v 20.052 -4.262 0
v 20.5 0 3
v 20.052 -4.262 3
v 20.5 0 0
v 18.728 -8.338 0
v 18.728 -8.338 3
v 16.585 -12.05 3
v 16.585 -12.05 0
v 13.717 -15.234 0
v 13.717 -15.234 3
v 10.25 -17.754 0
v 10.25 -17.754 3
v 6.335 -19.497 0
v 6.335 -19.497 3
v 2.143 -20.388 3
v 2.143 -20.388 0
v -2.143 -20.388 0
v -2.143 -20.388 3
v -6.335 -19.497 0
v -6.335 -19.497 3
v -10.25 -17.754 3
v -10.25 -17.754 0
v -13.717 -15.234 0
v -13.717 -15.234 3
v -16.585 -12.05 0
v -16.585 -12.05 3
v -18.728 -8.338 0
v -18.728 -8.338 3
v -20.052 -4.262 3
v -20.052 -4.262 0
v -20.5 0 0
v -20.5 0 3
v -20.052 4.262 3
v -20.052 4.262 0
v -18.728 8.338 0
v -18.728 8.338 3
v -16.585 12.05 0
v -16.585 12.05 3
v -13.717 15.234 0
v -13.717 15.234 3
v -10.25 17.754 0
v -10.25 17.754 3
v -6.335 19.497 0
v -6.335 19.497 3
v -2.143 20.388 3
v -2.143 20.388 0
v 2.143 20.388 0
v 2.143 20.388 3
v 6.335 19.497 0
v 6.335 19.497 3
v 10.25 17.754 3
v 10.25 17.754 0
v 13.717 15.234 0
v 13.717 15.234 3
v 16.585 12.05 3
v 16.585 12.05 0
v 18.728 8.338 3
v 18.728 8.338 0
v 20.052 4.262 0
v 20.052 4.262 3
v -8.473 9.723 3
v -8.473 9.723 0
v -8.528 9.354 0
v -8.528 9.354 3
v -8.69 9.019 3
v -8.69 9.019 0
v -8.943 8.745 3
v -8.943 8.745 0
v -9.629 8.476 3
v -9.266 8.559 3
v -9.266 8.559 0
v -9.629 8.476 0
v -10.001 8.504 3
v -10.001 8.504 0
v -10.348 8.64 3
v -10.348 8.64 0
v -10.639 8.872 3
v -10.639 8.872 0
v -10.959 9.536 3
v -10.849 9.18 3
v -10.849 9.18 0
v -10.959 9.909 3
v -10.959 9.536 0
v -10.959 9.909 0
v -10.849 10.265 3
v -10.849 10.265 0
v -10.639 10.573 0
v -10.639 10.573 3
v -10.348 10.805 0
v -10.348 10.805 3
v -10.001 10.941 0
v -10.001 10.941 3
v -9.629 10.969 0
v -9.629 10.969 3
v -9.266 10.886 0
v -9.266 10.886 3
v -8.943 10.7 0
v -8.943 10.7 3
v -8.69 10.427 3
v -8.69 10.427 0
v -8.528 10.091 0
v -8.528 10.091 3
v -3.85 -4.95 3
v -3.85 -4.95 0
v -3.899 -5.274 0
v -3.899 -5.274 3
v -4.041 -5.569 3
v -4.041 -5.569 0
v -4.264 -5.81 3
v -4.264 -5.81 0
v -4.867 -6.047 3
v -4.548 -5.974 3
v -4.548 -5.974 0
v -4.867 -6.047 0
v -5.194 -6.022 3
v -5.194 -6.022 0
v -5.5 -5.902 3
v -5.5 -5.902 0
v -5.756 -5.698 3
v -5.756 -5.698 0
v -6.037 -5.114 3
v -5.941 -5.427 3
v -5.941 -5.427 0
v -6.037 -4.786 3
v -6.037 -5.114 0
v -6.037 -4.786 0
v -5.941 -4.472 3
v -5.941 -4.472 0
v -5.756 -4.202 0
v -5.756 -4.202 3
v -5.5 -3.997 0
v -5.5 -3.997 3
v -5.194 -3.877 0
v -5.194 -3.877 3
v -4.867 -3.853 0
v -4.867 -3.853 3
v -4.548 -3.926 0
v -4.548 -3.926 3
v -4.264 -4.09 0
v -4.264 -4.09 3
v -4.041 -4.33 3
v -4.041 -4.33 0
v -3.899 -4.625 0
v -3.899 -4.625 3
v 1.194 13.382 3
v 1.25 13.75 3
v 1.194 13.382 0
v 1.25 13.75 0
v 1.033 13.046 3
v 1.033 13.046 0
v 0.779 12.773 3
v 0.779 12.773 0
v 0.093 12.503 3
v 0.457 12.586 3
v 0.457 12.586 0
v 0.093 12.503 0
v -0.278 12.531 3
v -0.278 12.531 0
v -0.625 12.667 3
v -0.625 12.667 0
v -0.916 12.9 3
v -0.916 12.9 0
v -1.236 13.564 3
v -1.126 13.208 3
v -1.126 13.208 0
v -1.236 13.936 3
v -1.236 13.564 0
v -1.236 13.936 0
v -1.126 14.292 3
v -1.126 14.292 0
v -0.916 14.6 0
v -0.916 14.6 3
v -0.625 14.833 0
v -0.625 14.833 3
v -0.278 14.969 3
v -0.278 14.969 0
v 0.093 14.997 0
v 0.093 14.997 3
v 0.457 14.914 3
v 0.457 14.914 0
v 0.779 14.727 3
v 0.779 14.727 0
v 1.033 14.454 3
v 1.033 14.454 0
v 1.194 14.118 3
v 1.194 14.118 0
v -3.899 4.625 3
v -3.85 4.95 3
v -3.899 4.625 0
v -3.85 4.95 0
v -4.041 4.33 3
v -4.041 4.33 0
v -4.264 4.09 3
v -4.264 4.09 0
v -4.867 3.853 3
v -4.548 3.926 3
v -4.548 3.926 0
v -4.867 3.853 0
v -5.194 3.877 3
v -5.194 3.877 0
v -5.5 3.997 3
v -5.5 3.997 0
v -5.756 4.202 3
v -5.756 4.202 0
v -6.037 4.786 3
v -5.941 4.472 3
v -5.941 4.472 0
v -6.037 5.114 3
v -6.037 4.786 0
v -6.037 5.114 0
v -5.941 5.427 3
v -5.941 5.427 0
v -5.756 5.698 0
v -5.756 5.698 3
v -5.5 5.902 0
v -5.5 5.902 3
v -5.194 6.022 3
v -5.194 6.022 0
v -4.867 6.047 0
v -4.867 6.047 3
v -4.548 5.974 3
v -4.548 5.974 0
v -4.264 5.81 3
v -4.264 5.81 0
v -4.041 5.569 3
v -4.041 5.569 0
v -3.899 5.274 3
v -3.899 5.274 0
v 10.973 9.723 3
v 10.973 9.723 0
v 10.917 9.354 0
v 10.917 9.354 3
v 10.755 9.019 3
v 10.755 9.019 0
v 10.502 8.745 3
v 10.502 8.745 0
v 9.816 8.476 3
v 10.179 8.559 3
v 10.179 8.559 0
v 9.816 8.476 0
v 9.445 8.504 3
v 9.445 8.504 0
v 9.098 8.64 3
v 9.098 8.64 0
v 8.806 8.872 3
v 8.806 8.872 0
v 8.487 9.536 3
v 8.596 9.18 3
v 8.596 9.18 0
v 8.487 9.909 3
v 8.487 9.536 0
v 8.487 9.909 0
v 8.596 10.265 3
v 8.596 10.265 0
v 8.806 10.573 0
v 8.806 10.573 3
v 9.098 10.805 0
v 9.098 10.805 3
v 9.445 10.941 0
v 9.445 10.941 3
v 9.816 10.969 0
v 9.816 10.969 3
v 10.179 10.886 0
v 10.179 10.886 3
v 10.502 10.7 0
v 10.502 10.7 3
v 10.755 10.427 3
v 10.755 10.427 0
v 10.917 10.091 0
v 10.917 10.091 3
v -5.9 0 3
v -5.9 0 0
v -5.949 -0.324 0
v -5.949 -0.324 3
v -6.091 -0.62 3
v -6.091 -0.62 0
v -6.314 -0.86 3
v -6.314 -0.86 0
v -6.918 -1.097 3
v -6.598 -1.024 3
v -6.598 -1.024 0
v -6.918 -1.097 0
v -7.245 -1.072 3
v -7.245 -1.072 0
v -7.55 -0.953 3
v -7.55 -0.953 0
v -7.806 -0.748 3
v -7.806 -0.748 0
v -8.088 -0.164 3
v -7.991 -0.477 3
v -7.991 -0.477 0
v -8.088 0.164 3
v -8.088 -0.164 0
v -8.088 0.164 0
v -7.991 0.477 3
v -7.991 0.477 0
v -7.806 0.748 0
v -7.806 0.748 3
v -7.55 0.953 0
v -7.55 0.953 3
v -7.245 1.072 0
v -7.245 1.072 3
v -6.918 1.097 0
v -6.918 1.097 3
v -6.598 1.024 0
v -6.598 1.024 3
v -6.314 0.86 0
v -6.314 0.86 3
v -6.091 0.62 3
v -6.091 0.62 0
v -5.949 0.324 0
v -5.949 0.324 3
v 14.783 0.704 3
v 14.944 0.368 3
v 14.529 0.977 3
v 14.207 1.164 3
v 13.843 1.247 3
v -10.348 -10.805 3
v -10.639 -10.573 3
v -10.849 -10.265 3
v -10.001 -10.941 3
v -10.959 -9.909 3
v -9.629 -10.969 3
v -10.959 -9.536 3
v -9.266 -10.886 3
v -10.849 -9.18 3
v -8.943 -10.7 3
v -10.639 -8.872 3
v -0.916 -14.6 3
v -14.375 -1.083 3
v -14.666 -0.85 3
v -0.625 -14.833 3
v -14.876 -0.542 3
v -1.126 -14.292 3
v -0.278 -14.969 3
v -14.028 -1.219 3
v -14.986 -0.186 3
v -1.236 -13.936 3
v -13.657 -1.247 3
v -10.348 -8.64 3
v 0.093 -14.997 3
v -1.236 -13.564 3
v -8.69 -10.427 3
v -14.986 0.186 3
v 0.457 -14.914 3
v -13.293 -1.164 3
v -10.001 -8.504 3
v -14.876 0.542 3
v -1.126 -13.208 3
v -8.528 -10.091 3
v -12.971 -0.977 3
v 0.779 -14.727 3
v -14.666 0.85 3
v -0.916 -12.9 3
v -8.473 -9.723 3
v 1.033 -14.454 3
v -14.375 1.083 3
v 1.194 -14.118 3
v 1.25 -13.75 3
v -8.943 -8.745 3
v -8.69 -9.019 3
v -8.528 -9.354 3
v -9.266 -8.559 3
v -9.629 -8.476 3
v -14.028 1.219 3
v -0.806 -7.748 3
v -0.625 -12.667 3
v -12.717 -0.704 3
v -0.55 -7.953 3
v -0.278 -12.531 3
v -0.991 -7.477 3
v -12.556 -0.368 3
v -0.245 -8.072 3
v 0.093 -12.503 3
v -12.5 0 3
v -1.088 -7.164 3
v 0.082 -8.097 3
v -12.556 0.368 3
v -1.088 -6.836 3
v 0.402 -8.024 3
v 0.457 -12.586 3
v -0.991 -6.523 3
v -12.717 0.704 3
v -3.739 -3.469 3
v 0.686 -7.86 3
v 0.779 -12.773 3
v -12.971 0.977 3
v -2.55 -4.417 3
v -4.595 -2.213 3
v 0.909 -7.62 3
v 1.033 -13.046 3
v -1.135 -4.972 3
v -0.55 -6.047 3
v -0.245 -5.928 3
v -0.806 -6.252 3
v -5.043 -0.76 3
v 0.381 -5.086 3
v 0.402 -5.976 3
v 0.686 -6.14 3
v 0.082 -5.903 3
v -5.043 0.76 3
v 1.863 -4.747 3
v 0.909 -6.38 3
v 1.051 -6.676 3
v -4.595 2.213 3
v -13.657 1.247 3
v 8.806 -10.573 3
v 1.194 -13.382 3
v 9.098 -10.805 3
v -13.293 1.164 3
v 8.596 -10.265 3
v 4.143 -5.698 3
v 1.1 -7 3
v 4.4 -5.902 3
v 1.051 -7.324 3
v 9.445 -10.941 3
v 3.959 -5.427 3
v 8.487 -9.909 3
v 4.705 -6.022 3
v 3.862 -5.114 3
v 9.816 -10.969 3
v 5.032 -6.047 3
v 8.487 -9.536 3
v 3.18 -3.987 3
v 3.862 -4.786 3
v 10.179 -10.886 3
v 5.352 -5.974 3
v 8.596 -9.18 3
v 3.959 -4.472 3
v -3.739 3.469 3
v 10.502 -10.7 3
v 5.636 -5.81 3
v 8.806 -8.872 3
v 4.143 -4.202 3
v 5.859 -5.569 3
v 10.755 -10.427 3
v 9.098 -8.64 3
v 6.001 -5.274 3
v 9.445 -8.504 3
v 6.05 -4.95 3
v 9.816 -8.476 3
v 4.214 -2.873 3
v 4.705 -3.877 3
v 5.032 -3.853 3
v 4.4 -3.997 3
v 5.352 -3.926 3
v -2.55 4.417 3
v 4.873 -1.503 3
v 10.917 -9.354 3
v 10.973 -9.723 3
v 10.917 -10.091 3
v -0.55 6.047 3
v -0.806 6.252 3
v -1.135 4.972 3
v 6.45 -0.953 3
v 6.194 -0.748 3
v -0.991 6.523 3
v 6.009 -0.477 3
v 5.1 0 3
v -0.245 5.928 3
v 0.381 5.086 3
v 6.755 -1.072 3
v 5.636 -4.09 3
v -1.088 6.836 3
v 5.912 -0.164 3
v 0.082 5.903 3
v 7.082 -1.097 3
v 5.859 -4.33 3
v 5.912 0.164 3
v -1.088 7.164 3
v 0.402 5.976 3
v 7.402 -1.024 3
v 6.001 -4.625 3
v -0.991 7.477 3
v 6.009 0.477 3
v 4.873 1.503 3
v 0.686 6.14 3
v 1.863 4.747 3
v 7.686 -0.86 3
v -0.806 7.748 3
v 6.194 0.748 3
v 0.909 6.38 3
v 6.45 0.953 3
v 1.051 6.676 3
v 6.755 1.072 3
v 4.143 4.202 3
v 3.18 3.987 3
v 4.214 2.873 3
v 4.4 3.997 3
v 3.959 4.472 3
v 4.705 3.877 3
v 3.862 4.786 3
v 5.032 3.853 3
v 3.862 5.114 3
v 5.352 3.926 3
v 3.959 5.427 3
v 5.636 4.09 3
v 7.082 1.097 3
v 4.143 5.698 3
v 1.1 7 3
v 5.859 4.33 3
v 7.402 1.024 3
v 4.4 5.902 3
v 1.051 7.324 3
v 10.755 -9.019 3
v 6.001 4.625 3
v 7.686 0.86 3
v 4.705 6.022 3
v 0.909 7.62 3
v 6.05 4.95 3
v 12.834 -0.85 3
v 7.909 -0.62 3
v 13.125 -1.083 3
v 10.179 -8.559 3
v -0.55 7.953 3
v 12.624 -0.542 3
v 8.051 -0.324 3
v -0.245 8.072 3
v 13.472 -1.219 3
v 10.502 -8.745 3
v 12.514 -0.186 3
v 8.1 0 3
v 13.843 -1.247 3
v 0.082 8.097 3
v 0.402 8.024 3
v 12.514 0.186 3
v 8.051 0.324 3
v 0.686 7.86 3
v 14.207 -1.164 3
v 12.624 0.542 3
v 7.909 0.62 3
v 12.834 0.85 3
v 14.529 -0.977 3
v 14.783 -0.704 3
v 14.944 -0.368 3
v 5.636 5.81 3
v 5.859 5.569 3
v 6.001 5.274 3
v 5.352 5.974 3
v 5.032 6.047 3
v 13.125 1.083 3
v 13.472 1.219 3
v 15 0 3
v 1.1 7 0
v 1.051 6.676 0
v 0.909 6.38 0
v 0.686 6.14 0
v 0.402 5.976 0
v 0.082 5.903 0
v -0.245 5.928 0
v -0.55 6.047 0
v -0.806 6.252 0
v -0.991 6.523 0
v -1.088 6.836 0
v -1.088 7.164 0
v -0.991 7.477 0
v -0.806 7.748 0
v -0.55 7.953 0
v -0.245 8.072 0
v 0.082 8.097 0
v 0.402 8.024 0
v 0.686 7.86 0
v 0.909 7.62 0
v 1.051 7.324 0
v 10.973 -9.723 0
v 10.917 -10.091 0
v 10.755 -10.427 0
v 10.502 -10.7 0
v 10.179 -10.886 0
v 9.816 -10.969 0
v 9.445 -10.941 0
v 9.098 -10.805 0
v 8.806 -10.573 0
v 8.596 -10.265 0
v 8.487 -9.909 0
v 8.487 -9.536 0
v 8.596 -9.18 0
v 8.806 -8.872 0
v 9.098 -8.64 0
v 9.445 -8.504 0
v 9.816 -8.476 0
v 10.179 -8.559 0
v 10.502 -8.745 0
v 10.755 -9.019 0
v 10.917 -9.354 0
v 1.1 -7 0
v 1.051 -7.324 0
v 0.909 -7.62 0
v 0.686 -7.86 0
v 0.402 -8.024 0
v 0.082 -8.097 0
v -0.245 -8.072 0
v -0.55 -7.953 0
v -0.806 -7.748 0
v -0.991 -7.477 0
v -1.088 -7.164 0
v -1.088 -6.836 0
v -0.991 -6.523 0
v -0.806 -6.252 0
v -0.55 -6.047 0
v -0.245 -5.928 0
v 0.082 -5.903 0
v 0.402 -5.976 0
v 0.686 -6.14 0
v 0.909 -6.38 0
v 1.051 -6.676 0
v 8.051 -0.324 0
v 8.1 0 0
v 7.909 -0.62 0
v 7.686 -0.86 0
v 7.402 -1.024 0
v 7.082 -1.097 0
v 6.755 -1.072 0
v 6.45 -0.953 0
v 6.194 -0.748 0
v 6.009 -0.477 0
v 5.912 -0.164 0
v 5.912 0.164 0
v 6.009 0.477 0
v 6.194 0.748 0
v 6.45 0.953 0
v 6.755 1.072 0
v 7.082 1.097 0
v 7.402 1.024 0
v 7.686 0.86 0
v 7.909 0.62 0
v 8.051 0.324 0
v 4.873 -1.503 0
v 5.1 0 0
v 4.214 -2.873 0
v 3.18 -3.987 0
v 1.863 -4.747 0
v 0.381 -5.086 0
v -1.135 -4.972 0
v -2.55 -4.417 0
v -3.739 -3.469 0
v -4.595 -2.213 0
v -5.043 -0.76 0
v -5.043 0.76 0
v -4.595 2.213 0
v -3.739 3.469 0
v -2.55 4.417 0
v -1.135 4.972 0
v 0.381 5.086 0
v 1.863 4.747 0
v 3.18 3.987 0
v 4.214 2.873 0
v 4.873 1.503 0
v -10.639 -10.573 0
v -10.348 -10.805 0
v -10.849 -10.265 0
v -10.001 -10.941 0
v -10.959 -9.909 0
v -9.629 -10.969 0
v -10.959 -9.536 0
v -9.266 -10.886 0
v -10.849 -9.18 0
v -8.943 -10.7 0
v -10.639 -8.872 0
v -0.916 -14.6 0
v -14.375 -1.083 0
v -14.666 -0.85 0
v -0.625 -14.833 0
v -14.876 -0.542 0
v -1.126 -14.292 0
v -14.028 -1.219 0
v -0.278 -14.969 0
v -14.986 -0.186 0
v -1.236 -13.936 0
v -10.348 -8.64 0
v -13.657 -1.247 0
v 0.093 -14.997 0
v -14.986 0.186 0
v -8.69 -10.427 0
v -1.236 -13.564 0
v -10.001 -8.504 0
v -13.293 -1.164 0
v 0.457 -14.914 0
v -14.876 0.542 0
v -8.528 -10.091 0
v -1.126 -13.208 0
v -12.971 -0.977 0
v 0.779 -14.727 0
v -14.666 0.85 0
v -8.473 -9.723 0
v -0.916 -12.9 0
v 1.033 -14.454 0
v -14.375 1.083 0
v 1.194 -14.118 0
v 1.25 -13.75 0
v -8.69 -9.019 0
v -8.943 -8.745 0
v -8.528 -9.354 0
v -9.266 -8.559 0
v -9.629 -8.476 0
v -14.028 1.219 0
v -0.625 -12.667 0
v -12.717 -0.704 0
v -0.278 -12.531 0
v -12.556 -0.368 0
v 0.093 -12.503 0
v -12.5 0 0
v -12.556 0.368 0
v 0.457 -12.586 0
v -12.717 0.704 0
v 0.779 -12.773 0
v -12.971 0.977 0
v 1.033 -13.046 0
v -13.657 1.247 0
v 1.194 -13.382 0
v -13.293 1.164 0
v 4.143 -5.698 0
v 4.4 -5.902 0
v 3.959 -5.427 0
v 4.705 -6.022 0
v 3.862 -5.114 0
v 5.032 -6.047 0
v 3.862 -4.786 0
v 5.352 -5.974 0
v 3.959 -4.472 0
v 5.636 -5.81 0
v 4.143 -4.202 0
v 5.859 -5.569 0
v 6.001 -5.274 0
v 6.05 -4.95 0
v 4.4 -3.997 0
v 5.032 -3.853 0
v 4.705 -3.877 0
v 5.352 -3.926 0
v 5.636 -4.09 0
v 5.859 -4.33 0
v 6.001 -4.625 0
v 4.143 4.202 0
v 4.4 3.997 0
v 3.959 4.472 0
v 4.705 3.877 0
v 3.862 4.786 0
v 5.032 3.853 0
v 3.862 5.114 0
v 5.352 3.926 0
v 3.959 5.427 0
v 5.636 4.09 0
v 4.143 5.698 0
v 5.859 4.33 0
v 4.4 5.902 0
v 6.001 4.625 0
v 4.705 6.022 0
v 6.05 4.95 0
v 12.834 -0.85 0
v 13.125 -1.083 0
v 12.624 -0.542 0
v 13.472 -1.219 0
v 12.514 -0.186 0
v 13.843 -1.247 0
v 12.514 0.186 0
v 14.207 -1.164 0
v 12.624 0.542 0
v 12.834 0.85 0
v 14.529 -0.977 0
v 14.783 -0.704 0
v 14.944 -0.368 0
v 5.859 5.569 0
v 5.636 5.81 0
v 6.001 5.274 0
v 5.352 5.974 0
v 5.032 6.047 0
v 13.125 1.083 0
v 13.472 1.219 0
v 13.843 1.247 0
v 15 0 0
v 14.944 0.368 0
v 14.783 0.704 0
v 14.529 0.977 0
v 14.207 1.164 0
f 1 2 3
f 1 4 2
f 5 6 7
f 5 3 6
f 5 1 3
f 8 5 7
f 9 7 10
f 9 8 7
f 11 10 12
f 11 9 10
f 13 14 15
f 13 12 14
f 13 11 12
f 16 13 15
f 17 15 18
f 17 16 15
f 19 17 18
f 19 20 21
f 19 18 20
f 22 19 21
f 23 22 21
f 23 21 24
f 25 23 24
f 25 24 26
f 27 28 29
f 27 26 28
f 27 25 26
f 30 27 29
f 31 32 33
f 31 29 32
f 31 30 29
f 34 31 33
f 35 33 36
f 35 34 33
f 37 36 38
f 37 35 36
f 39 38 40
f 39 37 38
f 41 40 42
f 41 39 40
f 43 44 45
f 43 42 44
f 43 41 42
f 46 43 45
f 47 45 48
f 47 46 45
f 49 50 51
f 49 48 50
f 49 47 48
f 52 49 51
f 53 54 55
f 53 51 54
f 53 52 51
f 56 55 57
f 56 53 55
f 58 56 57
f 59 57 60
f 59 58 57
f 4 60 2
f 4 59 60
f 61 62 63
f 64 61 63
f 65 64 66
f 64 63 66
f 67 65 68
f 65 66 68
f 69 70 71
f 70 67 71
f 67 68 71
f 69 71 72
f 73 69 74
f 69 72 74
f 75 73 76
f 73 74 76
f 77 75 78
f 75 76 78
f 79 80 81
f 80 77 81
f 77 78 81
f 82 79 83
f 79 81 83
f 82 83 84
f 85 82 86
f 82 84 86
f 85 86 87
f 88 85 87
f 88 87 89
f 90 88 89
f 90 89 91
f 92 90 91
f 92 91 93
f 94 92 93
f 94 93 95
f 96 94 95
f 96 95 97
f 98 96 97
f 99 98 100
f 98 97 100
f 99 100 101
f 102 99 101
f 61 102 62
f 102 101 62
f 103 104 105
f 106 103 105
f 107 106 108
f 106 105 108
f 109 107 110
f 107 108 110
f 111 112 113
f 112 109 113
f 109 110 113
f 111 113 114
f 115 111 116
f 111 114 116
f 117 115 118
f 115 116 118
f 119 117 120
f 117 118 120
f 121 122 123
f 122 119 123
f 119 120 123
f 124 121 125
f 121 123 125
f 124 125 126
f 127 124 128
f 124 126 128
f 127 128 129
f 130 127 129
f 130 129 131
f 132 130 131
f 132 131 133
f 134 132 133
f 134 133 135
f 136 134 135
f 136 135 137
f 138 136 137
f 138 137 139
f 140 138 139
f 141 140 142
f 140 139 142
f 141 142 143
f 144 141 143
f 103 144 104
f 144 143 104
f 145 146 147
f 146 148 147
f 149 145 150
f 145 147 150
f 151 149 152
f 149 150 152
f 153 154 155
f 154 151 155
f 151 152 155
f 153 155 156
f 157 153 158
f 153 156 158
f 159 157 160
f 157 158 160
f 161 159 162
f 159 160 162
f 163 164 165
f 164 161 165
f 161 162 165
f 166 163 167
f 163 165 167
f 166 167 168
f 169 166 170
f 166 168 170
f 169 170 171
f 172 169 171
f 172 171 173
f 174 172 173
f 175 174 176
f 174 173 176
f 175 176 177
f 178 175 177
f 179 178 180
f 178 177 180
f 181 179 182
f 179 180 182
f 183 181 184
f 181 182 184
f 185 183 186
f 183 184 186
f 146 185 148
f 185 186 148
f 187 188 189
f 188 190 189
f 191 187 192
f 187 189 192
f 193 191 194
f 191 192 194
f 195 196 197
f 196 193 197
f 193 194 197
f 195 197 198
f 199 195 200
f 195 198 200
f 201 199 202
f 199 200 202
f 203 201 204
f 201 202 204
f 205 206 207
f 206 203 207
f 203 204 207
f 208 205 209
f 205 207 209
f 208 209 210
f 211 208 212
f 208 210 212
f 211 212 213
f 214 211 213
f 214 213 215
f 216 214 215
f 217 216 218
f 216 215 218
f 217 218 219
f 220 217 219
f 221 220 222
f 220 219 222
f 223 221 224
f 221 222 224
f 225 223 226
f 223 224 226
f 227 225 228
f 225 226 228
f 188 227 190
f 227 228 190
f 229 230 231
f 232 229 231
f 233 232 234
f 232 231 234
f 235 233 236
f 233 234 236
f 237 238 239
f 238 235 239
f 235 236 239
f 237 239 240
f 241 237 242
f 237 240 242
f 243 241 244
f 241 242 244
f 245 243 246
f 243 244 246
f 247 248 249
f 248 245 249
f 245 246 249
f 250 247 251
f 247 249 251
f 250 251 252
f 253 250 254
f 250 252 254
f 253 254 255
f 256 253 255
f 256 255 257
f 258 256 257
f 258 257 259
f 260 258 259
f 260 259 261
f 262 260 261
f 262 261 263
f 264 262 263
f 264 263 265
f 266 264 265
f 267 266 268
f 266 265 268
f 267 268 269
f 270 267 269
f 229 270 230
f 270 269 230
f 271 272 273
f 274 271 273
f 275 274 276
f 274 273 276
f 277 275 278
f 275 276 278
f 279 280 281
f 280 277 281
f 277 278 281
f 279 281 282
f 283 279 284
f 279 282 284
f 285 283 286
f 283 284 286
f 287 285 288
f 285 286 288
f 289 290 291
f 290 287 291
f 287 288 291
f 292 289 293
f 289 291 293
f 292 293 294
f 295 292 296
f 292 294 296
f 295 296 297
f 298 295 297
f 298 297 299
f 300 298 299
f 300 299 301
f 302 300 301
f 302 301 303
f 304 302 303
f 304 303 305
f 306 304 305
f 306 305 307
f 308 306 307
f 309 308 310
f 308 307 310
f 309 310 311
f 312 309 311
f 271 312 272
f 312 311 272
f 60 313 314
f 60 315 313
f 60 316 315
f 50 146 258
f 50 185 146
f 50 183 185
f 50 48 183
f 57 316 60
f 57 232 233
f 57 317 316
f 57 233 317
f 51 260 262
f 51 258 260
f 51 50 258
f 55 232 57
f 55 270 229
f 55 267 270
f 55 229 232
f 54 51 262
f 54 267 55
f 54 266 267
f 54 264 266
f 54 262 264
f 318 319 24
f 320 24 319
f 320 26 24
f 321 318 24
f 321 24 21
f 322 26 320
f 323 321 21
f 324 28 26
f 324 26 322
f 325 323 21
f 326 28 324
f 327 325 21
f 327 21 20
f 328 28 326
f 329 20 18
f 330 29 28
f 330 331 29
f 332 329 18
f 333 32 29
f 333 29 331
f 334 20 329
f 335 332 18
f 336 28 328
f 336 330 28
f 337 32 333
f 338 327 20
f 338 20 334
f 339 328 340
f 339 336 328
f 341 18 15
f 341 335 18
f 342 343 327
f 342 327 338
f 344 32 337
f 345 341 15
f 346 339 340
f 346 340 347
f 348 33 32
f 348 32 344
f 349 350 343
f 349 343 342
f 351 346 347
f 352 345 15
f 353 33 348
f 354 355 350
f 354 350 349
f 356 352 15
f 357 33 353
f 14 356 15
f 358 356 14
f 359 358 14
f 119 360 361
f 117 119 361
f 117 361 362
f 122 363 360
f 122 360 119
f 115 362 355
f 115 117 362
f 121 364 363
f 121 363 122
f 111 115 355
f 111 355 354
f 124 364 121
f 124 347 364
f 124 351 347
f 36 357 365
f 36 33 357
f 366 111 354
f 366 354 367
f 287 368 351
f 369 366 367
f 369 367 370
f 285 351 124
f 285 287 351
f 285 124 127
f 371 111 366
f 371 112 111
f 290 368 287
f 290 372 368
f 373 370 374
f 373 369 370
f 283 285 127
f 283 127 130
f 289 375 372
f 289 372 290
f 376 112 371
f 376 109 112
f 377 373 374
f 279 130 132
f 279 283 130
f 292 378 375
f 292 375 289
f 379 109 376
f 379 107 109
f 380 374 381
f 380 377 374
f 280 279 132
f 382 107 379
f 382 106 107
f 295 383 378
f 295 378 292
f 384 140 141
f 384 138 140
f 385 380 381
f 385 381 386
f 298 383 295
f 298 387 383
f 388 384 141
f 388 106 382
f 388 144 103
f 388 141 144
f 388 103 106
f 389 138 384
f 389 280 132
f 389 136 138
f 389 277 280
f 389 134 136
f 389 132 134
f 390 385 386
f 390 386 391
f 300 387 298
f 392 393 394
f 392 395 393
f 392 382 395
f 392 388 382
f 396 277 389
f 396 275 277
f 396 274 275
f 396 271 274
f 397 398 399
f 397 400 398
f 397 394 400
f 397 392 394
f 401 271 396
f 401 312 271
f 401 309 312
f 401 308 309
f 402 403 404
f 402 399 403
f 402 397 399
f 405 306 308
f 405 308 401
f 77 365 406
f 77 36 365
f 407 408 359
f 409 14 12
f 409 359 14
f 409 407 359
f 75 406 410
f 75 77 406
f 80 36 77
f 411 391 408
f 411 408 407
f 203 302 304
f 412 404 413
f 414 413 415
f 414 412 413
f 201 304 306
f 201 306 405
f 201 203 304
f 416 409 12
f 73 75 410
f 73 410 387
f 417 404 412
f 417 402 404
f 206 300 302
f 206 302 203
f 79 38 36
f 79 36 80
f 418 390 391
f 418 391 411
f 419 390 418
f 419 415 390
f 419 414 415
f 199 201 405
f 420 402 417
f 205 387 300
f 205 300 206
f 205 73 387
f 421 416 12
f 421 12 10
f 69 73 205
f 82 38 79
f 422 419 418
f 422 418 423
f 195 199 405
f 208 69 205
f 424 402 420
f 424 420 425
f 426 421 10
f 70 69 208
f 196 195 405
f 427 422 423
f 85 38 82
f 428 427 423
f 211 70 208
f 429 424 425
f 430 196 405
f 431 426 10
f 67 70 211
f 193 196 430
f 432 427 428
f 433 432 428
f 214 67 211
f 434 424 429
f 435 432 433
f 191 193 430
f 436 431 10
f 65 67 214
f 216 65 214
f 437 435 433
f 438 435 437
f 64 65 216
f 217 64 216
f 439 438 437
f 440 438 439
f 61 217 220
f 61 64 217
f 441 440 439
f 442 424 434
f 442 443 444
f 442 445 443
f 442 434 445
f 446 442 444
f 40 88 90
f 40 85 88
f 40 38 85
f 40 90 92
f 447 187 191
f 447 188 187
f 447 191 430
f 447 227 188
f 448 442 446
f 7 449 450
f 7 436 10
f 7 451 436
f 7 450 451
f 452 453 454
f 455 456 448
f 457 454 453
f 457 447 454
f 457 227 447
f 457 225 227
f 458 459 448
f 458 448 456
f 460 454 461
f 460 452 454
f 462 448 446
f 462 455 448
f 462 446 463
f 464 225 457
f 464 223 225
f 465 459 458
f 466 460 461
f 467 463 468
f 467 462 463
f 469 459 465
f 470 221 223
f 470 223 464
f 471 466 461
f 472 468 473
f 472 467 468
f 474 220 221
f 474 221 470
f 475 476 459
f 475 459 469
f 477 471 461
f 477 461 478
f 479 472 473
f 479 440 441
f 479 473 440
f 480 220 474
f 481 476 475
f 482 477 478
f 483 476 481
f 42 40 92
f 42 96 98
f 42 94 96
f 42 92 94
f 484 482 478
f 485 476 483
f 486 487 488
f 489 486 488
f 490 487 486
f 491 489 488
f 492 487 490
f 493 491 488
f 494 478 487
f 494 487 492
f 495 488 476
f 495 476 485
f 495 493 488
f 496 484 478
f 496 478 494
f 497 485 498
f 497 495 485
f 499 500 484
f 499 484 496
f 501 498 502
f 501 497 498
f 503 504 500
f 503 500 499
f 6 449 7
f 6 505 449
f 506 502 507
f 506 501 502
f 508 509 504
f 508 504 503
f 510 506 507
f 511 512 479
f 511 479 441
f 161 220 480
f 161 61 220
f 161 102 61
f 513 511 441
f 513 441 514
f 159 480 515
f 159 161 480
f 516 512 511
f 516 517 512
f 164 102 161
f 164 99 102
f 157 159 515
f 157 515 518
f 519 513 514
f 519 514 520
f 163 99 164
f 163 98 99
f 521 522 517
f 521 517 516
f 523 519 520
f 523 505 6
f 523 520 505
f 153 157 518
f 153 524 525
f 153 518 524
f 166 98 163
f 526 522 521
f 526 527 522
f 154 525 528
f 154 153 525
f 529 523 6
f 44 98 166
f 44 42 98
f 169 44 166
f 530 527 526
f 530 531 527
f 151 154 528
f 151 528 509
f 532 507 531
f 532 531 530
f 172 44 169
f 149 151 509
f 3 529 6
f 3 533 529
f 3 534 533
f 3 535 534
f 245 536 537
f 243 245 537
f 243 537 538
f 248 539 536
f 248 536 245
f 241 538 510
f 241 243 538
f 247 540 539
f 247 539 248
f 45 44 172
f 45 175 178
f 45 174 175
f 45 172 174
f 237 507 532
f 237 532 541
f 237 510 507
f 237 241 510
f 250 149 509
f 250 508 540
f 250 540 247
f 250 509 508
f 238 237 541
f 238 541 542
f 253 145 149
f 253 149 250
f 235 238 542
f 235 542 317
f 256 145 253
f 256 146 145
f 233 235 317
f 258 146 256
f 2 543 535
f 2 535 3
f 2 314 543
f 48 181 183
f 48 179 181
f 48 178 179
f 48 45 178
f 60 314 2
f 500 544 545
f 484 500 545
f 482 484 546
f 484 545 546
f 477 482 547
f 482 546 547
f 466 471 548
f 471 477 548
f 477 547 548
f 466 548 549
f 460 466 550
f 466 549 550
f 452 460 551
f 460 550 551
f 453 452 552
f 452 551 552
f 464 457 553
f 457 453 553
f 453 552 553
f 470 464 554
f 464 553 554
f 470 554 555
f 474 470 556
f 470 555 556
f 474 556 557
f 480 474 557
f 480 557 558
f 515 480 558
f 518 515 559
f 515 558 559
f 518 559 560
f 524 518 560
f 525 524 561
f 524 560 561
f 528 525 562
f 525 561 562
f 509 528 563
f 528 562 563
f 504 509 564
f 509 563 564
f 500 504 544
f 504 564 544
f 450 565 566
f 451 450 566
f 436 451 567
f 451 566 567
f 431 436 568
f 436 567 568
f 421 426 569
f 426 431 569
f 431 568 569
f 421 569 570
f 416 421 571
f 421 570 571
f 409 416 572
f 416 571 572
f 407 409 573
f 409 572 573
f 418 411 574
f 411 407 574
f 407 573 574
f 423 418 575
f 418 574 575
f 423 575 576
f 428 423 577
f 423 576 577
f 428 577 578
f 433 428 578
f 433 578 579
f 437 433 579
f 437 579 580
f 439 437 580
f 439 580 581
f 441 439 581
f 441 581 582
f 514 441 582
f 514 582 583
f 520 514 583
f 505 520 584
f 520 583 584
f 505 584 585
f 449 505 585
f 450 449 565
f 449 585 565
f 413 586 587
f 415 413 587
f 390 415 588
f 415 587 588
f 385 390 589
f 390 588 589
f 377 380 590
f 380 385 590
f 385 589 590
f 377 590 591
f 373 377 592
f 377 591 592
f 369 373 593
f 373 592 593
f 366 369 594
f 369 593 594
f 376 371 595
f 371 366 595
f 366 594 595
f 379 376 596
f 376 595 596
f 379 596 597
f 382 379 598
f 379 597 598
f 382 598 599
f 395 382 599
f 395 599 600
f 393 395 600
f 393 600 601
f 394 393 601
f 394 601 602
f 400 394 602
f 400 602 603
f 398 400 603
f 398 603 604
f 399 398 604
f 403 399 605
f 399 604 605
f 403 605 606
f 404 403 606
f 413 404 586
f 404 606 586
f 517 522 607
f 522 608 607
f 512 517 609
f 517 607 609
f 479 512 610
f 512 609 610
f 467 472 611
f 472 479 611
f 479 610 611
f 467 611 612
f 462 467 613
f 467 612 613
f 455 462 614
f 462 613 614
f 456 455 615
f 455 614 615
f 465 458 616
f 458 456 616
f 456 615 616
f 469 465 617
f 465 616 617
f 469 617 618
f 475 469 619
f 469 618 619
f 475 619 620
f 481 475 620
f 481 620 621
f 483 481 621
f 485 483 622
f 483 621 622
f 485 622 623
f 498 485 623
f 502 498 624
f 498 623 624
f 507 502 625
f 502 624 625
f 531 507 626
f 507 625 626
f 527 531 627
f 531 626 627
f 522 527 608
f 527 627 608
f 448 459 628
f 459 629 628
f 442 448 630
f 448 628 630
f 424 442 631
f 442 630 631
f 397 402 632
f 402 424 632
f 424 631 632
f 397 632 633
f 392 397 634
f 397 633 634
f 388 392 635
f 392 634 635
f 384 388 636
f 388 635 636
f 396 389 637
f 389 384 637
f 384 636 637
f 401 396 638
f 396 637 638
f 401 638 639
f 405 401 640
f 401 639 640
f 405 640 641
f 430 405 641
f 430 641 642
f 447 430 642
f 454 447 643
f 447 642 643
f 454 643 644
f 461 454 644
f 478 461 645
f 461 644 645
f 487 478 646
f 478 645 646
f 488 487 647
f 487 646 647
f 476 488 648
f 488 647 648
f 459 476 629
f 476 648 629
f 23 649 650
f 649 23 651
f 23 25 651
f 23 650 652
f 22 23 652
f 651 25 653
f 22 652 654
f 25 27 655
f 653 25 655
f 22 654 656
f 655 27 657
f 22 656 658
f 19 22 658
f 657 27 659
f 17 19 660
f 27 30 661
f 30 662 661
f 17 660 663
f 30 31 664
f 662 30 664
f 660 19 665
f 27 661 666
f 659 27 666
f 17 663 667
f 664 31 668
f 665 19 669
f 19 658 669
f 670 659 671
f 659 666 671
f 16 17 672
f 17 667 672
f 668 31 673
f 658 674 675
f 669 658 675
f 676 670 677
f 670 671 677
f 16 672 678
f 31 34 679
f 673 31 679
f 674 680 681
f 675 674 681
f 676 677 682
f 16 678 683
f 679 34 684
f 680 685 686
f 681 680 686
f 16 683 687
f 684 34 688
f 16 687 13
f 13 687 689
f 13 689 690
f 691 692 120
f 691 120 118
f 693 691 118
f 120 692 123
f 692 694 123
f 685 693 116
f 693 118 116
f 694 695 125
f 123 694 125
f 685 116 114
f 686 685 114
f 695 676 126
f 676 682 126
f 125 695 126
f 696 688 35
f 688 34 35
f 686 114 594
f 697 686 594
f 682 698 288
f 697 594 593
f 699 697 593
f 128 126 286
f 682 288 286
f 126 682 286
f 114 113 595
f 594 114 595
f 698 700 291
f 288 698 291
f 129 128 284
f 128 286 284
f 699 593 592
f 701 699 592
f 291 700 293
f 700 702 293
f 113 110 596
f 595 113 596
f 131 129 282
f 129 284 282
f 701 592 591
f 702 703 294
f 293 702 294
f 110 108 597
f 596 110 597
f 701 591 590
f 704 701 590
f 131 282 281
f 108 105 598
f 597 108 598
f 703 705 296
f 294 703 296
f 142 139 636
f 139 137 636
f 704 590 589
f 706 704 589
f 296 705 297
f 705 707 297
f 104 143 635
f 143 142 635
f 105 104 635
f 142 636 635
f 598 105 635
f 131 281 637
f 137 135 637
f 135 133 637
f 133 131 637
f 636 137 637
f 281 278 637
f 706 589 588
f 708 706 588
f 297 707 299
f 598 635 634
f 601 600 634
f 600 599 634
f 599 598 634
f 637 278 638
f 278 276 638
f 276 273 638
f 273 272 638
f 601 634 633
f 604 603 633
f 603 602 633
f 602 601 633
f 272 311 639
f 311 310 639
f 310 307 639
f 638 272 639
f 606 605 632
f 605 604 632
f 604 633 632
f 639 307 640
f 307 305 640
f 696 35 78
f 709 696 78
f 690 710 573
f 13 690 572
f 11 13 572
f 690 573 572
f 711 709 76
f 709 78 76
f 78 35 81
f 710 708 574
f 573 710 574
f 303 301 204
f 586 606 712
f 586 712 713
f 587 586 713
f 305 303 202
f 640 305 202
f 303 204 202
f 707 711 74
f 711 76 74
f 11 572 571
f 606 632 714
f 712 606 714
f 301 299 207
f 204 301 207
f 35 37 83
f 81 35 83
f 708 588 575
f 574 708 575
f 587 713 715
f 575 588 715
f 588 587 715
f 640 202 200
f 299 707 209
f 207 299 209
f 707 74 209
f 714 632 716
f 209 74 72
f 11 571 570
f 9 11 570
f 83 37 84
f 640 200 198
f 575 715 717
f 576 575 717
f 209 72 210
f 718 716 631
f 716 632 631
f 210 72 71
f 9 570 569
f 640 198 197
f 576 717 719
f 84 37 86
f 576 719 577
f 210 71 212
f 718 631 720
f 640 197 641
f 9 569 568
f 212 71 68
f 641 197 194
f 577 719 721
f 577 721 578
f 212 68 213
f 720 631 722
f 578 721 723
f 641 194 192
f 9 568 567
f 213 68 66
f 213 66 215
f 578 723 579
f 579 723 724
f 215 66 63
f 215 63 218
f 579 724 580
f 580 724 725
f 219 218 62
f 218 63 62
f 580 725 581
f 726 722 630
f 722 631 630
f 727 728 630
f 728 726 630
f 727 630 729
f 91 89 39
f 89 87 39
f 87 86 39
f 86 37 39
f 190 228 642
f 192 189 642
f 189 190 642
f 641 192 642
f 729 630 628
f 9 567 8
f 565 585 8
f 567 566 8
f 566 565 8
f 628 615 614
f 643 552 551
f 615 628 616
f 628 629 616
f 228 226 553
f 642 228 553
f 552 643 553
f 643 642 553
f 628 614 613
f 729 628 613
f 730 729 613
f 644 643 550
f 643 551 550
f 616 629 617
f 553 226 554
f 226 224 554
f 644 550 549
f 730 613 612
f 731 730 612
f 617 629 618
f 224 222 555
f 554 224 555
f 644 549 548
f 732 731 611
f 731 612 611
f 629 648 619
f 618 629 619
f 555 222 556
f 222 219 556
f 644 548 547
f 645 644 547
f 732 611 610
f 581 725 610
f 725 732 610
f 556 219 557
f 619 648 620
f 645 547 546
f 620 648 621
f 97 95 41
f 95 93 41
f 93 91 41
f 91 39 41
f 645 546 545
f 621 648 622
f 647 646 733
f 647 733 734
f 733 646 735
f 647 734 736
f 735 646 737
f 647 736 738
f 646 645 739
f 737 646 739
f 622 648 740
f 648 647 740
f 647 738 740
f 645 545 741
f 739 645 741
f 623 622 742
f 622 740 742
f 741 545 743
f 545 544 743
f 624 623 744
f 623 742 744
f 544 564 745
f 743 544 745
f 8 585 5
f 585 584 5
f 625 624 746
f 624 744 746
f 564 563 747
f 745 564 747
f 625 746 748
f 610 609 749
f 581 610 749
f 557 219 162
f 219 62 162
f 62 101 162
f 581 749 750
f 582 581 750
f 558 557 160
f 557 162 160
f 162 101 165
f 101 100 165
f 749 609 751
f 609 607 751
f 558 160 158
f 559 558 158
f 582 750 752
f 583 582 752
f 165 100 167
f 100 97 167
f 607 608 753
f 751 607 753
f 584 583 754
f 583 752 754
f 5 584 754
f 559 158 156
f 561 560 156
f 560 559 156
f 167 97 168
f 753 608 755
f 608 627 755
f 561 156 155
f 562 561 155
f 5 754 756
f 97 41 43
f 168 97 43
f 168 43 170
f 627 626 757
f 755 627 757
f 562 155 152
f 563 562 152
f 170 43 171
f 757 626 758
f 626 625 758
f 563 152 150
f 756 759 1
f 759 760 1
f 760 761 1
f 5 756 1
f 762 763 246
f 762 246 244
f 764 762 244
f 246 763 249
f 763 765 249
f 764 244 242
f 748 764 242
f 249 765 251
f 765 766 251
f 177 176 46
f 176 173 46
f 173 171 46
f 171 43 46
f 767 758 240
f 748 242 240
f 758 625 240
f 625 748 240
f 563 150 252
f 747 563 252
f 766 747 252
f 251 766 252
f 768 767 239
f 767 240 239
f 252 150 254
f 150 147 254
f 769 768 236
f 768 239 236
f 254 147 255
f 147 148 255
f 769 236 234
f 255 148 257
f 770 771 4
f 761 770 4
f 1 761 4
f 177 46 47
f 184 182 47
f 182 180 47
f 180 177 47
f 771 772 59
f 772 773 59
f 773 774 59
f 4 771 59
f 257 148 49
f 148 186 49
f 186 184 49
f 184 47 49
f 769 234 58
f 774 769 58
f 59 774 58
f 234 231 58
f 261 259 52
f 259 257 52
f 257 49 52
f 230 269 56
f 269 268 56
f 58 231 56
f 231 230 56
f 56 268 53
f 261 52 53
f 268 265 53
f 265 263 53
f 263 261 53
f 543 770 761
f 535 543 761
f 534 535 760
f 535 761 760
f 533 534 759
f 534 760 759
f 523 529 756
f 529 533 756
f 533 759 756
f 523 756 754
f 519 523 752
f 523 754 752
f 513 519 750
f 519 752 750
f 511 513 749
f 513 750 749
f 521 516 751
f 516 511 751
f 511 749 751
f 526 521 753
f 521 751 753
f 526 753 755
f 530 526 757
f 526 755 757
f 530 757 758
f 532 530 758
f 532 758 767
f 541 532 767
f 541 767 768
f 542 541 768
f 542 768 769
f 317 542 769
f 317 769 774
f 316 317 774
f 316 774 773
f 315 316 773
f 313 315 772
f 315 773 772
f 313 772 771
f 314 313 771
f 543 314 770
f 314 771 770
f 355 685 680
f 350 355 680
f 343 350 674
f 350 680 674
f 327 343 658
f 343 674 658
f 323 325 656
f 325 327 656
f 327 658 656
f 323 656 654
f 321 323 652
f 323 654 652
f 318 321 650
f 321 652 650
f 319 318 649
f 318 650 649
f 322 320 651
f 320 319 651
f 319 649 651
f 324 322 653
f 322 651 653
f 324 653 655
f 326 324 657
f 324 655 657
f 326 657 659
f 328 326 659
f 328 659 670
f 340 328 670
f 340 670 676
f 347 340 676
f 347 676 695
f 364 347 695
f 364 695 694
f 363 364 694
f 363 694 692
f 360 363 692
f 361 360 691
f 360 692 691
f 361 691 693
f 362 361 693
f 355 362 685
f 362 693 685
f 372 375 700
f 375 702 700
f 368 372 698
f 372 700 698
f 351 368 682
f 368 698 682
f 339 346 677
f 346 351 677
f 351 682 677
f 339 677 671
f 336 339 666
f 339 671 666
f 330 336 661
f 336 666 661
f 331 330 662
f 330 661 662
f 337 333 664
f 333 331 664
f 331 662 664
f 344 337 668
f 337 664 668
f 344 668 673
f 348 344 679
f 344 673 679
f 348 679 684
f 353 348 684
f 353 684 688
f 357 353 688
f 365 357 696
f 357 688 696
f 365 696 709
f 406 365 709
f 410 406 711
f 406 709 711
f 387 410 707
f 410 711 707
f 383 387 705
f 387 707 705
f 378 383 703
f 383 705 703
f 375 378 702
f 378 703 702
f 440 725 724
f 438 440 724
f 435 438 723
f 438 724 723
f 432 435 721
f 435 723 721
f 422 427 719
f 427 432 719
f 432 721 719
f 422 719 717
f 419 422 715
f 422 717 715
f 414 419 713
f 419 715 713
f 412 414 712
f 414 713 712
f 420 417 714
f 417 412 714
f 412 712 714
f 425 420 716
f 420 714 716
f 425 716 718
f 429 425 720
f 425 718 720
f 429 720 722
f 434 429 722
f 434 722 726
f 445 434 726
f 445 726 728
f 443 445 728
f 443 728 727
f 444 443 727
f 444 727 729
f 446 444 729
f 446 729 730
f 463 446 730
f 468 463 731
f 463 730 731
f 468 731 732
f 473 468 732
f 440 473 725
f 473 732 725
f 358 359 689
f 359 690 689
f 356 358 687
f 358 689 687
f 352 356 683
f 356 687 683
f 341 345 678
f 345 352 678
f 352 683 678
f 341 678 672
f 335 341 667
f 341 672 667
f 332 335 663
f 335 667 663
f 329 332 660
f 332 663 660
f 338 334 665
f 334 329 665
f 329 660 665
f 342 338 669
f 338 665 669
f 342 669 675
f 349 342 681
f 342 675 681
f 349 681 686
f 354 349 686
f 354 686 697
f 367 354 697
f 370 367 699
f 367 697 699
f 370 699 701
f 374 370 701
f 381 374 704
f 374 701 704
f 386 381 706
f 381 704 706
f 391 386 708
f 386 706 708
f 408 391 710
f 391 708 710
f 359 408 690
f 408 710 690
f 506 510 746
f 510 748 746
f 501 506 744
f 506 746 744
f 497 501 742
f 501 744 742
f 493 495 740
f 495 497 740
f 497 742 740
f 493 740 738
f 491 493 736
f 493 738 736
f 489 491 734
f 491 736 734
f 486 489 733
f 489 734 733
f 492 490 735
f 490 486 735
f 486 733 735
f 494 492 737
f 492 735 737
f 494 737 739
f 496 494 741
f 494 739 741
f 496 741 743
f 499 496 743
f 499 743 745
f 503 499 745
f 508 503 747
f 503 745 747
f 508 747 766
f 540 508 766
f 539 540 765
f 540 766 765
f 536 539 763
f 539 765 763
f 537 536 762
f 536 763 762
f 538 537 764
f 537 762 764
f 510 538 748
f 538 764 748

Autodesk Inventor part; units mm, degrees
ref_plane "YZ Plane" through (0, 0, 0) normal (1, 0, 0) x (0, 1, 0)
ref_plane "XZ Plane" through (0, 0, 0) normal (0, 1, 0) x (-1, 0, 0)
ref_plane "XY Plane" through (0, 0, 0) normal (0, 0, 1) x (1, 0, 0)
sketch "スケッチ1" plane through (0, 0, 0) normal (0, 0, 1) x (1, 0, 0)
  circle A0 centre (0, 0) radius 20.5
  circle A1 centre (0, 0) radius 10 construction
  circle A2 centre (0, 0) radius 7 construction
  circle A3 centre (0, -7) radius 1.1
  circle A4 centre (4.9497, -4.9497) radius 1.1
  circle A5 centre (7, 0) radius 1.1
  circle A6 centre (4.9497, 4.9497) radius 1.1
  circle A7 centre (0, 7) radius 1.1
  circle A8 centre (-4.9497, 4.9497) radius 1.1
  circle A9 centre (-7, 0) radius 1.1
  circle A10 centre (-4.9497, -4.9497) radius 1.1
  circle A11 centre (0, 0) radius 15.5 construction
  circle A12 centre (0, 0) radius 12 construction
  line L0 (0, -12) -> (0, -15.5) construction
  circle A13 centre (0, -13.75) radius 1.25
  circle A14 centre (43.1211, 8.0958) radius 5 projected
  circle A15 centre (46.9662, 2.2465) radius 0.8 projected
  circle A16 centre (49.9761, 6.6786) radius 0.8 projected
  circle A17 centre (48.9705, 11.9409) radius 0.8 projected
  circle A18 centre (44.5383, 14.9509) radius 0.8 projected
  circle A19 centre (39.276, 13.9452) radius 0.8 projected
  circle A20 centre (36.2661, 9.513) radius 0.8 projected
  circle A21 centre (37.2717, 4.2507) radius 0.8 projected
  circle A22 centre (41.7039, 1.2408) radius 0.8 projected
  circle A23 centre (43.1211, 8.0958) radius 10 projected
  circle A24 centre (0, 0) radius 5.1
  circle A25 centre (0, 0) radius 13.75 construction
  circle A26 centre (9.7227, -9.7227) radius 1.25
  circle A27 centre (13.75, 0) radius 1.25
  circle A28 centre (9.7227, 9.7227) radius 1.25
  circle A29 centre (0, 13.75) radius 1.25
  circle A30 centre (-9.7227, 9.7227) radius 1.25
  circle A31 centre (-13.75, 0) radius 1.25
  circle A32 centre (-9.7227, -9.7227) radius 1.25
  dimension "d2" = 14
  dimension "d6" = 360
  dimension "d0" = 41
  dimension "d1" = 20
  dimension "d3" = 2.2
  dimension "d8" = 5
  dimension "d10" = 2.5
  dimension "d15" = 10.2
  dimension "d18" = 27.5
  dimension "d19" = 13.75
  dimension "d22" = 360
extrude "押し出し2" add sketch "スケッチ1" along normal blind 3 contours A0
properties part number "出力部品A_ダブルスラスト用(t2_アルミ)" material "アルミニウム 6061"
